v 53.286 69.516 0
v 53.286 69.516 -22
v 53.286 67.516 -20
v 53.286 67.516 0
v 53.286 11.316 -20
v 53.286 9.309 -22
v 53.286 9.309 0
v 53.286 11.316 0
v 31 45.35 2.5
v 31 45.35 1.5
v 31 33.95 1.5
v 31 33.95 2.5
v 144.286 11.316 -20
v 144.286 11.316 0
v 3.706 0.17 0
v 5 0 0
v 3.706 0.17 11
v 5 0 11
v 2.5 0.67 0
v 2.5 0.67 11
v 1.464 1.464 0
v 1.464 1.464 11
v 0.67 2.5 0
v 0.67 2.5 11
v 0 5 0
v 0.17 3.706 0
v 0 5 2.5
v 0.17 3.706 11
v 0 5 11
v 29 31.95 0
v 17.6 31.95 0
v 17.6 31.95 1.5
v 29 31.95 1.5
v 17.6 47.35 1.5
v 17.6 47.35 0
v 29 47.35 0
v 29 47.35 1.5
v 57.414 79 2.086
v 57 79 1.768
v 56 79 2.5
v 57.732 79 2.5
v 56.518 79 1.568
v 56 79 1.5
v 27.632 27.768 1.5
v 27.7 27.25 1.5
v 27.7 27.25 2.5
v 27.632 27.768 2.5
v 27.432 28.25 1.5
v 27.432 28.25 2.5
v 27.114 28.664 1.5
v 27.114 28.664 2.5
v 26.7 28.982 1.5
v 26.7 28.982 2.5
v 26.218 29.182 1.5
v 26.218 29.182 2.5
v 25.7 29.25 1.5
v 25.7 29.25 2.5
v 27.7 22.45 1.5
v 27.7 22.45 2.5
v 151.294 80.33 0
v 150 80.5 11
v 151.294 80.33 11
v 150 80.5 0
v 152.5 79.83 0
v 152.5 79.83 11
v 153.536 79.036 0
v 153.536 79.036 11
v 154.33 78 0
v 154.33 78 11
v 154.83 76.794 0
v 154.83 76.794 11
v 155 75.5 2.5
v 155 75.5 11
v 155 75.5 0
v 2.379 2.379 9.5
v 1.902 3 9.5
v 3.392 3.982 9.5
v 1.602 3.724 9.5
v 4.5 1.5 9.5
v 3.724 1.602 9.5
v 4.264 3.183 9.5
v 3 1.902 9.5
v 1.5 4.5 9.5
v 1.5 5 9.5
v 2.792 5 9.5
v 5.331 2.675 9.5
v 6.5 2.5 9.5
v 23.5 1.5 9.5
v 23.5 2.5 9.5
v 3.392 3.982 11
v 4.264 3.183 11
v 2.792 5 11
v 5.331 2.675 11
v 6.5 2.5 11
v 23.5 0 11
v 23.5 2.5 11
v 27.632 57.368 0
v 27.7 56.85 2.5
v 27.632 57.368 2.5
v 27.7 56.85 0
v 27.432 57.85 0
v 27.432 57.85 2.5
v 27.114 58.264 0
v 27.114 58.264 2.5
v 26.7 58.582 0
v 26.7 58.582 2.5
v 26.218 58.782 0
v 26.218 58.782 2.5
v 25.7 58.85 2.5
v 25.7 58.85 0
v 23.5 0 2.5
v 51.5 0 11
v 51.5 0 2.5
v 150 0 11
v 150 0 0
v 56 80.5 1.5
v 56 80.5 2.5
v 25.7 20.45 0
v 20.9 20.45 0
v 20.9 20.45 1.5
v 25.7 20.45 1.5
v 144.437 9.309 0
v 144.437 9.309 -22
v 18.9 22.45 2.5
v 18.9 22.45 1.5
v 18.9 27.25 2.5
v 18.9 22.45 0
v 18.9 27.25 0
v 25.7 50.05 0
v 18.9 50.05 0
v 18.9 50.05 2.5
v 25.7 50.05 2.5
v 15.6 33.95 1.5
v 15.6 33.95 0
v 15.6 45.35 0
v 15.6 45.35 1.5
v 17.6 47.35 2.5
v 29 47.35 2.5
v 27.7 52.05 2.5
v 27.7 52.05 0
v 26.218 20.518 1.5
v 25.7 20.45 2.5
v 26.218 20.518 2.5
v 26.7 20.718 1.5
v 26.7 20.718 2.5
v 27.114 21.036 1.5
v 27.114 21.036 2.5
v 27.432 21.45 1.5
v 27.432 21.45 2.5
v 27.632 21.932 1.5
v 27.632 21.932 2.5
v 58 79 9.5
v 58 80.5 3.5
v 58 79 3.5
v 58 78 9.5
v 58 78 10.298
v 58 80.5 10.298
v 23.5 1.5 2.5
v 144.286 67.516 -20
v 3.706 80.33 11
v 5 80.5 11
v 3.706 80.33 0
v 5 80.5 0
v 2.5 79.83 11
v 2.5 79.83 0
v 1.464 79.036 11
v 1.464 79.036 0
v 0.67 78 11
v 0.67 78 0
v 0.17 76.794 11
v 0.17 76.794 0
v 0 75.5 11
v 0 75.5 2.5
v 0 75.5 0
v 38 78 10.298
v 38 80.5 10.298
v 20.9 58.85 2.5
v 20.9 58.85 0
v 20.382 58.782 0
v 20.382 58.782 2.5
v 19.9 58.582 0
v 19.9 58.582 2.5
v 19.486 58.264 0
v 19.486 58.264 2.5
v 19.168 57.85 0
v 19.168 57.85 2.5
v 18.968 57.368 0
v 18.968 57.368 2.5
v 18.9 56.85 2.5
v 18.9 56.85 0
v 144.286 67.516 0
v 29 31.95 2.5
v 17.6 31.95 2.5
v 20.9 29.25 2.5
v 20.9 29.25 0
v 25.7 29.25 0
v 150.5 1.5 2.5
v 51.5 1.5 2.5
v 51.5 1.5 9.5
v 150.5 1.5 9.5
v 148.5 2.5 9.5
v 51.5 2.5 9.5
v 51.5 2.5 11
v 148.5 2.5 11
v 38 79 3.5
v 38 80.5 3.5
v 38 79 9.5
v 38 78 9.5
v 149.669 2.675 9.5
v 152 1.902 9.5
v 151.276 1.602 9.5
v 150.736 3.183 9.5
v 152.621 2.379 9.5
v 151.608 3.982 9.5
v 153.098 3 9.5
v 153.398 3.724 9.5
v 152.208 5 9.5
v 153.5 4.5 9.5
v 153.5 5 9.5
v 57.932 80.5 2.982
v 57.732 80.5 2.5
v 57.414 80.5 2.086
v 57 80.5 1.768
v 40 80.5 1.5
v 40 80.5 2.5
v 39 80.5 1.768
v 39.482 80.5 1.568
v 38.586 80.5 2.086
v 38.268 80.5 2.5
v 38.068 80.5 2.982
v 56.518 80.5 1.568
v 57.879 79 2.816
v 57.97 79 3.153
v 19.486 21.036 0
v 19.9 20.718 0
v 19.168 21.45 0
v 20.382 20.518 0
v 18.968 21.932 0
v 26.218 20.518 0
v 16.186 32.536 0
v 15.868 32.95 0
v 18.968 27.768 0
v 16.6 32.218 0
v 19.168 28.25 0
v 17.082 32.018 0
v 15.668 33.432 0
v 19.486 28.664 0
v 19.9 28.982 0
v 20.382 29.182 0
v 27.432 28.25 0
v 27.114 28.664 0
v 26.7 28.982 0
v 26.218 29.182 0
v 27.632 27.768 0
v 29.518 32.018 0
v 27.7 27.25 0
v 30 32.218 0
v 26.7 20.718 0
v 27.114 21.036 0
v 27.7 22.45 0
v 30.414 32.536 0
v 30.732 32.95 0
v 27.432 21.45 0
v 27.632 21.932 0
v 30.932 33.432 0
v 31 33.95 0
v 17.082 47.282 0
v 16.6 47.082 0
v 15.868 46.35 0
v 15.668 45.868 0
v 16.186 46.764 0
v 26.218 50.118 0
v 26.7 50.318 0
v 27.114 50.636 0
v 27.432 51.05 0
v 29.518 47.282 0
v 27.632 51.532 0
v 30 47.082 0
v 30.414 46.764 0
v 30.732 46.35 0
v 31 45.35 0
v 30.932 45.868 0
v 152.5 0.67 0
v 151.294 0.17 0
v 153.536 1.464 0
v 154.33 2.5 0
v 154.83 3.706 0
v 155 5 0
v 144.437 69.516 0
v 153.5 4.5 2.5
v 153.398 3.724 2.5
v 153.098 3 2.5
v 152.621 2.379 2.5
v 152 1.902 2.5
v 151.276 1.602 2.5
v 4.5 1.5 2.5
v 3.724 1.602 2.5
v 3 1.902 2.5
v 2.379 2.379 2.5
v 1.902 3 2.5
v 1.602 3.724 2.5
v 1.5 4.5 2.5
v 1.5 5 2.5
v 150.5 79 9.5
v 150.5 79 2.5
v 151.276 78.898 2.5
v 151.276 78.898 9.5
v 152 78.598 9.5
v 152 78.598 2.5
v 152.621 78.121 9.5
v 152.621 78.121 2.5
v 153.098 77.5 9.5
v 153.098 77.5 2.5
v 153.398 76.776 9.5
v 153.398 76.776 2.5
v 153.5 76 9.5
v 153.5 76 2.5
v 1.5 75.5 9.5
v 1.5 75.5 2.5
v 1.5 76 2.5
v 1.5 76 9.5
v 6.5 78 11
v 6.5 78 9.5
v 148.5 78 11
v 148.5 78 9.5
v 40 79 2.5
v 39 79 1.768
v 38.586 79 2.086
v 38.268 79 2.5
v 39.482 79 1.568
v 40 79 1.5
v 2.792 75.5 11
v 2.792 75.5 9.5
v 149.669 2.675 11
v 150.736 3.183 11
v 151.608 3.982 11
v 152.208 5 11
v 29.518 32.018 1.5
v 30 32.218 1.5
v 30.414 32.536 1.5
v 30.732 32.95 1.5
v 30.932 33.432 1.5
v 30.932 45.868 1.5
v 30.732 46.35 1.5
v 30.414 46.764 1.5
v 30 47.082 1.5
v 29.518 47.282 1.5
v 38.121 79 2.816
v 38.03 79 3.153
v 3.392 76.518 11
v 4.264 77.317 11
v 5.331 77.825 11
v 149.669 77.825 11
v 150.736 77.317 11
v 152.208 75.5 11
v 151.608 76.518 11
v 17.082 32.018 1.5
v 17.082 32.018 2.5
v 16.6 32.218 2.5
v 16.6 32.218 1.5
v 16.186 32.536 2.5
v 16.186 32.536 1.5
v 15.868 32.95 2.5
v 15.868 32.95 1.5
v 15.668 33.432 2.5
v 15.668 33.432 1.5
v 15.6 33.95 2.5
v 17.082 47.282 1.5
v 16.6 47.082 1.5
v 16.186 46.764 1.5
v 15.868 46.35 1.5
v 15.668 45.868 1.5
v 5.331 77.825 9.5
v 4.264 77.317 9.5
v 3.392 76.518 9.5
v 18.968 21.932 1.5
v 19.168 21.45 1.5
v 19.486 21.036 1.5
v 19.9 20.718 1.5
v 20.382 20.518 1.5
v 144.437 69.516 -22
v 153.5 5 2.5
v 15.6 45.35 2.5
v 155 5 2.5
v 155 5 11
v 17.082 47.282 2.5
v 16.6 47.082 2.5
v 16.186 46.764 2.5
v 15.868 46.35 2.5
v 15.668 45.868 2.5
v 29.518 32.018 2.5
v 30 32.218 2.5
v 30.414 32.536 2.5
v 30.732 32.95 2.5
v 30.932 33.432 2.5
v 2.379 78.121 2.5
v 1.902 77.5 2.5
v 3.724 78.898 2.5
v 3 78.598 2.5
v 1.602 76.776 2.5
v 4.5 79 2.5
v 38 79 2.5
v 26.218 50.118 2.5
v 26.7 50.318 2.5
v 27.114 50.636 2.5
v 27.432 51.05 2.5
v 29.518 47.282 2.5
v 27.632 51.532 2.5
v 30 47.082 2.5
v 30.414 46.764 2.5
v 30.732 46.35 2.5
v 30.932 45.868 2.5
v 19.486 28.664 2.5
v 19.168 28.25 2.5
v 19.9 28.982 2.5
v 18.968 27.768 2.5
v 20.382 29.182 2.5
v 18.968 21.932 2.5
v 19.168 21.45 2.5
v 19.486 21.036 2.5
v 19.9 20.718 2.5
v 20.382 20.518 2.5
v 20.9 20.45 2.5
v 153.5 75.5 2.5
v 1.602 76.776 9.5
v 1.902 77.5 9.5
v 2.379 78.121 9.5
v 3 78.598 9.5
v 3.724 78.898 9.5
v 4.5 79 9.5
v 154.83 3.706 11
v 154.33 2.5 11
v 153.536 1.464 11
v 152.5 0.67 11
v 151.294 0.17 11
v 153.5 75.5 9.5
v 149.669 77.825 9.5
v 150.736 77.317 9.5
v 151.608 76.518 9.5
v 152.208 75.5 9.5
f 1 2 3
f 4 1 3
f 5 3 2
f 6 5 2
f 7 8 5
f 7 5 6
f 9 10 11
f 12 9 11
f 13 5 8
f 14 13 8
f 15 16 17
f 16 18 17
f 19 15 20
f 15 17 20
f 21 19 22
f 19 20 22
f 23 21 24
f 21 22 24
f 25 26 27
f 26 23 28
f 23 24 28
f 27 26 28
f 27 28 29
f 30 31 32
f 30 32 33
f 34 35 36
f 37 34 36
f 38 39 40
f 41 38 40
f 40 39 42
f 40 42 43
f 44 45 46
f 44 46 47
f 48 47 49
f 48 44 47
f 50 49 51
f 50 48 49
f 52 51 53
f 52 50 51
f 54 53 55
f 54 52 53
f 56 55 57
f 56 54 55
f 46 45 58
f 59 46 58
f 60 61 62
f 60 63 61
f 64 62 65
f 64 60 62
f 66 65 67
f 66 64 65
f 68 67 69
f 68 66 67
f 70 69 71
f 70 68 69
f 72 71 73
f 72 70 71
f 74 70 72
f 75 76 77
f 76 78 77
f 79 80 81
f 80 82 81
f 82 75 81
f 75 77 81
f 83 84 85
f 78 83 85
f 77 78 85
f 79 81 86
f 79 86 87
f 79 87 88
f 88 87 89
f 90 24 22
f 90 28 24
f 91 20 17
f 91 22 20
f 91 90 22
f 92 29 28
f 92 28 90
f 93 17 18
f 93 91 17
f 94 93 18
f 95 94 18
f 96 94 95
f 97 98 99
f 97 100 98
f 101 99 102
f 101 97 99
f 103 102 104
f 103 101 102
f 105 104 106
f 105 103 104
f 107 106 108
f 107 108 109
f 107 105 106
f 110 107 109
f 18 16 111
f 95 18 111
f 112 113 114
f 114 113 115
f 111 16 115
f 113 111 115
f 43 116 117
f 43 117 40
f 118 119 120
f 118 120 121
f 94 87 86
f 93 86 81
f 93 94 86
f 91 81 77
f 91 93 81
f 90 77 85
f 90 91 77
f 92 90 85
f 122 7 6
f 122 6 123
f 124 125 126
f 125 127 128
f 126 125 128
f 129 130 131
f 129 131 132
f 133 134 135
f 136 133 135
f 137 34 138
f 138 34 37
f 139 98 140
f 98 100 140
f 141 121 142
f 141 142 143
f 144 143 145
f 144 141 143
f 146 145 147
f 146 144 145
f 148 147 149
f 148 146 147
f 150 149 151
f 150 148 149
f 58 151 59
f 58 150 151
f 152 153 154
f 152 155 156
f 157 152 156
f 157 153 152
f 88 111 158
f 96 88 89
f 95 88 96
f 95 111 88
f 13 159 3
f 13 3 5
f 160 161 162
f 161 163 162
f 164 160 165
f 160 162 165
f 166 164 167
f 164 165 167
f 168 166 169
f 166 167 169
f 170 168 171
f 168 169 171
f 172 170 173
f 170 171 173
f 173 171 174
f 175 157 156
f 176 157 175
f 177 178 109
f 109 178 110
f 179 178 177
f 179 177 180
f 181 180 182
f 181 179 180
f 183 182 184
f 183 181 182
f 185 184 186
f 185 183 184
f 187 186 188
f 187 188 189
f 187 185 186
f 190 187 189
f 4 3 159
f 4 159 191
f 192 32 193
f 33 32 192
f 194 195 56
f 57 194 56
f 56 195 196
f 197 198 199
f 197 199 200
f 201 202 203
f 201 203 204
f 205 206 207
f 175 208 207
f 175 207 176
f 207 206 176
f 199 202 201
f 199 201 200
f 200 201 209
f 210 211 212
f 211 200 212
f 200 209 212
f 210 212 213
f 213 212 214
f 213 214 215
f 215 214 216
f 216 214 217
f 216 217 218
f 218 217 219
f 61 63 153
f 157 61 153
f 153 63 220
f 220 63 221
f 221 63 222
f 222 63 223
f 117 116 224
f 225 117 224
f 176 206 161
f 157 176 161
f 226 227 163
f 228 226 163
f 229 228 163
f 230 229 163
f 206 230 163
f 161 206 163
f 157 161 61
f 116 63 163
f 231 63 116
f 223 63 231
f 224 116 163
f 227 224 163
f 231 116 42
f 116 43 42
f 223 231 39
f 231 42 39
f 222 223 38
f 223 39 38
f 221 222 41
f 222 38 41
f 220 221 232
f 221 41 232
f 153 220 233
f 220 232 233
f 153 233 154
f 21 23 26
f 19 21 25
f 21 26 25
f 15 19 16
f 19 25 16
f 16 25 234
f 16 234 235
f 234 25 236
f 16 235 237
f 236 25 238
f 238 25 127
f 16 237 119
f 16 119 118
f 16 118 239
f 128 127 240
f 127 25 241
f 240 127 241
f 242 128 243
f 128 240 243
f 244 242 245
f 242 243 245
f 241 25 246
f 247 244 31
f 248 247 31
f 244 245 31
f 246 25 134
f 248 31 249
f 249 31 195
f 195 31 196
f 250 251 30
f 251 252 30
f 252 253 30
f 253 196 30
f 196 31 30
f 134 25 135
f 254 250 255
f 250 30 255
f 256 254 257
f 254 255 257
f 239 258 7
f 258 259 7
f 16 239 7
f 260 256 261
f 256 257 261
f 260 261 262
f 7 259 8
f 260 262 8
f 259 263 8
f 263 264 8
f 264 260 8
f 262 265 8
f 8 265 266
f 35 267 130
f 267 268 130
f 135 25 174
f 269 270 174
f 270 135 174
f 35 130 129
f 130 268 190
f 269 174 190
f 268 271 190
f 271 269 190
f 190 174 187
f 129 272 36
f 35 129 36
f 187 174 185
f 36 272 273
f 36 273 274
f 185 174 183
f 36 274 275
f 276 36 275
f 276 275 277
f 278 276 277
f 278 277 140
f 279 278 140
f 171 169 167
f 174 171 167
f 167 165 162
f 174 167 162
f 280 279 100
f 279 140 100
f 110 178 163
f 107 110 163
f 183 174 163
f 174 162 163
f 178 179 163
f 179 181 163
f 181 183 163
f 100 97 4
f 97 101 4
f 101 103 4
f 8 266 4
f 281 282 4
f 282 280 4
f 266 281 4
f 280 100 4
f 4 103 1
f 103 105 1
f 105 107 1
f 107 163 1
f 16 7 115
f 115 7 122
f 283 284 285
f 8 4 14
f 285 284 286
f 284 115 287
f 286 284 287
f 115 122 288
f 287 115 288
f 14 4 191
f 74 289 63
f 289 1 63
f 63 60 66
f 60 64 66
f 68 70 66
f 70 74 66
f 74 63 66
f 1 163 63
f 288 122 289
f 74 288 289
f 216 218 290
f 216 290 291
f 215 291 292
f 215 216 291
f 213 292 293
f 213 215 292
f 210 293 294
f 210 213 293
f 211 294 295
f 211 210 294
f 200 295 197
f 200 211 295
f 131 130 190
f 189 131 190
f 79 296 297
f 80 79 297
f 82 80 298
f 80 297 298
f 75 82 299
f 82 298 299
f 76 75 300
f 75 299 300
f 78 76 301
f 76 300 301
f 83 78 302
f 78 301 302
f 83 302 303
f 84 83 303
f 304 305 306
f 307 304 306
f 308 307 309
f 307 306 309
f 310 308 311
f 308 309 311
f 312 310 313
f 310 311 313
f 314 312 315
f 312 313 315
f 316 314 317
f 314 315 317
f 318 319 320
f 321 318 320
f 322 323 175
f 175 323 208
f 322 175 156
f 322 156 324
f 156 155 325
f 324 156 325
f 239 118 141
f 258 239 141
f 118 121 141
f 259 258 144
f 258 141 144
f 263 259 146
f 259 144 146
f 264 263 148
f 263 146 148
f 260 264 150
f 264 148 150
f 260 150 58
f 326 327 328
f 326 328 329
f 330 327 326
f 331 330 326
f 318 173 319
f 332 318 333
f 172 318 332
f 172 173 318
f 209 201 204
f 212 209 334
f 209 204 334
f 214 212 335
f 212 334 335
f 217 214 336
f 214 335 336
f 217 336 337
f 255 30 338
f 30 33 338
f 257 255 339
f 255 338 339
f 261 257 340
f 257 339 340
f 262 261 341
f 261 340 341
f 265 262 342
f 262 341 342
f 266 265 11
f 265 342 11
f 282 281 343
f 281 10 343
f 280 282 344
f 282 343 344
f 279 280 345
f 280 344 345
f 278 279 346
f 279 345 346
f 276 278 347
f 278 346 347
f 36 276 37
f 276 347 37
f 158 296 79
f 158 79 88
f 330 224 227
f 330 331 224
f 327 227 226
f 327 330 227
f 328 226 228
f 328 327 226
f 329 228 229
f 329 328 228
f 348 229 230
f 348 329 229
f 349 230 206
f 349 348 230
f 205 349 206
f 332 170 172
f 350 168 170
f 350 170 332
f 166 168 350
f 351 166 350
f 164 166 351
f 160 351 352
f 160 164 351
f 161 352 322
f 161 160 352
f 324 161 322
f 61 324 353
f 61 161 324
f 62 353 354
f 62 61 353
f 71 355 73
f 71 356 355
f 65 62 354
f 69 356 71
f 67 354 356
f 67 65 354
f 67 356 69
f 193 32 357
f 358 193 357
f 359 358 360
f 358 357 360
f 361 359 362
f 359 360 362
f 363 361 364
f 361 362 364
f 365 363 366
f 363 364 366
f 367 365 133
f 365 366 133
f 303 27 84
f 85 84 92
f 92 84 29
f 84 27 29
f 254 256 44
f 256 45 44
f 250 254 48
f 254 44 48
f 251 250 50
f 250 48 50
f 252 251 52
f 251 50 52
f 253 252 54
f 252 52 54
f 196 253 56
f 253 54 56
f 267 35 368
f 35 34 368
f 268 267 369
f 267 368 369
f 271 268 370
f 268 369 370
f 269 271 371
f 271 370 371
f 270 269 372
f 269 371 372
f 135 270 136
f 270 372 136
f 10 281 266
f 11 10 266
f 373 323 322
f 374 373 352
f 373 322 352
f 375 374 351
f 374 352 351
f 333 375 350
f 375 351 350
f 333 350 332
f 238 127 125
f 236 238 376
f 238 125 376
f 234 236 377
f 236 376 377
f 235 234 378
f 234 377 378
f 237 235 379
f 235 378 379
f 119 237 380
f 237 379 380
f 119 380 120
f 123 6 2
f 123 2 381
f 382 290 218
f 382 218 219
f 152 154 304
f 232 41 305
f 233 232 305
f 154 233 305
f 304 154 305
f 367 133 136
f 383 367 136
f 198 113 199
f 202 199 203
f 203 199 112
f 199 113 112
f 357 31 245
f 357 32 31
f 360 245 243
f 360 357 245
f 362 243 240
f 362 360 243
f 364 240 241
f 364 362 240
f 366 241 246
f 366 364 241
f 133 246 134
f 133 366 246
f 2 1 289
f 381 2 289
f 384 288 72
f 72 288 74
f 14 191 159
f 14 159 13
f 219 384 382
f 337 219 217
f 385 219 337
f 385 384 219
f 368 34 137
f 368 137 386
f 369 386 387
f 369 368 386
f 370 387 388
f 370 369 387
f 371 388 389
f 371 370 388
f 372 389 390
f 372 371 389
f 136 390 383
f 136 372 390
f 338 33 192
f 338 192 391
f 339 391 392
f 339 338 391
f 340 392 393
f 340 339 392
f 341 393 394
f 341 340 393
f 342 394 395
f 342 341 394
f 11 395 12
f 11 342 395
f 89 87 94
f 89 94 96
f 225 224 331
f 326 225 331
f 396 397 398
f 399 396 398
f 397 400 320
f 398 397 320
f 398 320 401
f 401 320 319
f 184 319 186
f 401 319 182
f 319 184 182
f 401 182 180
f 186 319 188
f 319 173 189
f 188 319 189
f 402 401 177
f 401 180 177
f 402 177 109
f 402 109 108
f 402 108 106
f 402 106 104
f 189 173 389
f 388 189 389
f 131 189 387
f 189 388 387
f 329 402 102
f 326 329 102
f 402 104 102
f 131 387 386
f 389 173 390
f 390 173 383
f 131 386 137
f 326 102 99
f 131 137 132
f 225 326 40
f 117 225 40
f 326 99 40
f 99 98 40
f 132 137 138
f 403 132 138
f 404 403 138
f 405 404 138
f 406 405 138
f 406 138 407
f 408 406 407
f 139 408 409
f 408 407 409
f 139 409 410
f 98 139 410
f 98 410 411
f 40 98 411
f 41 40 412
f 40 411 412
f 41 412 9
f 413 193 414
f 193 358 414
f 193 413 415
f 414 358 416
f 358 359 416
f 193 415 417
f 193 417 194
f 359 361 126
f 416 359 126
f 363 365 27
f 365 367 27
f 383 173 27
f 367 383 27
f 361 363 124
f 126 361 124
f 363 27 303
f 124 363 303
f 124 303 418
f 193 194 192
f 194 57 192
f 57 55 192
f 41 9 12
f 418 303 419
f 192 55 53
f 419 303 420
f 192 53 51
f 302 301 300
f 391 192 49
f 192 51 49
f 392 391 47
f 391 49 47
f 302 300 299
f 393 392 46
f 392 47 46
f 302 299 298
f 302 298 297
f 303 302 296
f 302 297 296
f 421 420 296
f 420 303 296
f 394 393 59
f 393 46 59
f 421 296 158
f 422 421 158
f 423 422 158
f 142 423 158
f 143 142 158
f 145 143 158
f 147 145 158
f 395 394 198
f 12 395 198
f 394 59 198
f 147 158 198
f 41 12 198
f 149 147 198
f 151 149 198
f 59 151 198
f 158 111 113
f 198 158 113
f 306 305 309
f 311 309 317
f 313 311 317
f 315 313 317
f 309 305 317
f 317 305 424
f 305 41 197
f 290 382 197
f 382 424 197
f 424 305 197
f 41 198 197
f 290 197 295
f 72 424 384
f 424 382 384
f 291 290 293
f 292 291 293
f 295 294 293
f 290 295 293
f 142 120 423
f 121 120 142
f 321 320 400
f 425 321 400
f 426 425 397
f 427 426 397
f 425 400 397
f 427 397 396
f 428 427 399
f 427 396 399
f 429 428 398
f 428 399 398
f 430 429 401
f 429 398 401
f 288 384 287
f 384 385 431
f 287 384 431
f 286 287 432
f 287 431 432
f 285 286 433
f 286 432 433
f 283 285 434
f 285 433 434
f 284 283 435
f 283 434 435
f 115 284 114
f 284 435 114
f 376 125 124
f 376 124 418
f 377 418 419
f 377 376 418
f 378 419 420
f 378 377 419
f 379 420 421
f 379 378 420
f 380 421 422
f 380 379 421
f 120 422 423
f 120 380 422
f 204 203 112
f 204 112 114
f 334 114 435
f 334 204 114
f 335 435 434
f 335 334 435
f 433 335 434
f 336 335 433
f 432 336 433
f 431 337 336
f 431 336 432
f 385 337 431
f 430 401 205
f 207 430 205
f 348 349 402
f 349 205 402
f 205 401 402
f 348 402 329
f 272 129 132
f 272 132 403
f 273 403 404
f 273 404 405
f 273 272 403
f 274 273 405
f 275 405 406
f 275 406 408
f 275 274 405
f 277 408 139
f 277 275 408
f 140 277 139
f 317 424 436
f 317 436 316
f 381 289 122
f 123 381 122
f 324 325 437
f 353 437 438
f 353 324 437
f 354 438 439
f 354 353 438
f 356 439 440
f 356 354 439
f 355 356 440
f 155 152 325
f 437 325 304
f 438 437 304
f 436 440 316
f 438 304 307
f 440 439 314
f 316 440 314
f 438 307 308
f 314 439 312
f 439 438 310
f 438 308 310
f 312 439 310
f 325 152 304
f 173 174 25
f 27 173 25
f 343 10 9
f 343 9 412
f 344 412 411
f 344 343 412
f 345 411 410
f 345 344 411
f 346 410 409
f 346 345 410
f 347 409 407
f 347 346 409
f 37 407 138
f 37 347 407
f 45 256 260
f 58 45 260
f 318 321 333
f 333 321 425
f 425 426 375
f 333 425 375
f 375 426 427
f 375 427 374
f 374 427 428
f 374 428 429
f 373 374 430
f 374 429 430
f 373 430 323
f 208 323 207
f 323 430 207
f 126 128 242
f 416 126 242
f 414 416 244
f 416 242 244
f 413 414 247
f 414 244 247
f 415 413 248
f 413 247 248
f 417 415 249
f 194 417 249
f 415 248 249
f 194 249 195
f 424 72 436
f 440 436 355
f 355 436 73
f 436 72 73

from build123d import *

# Parameters (mm, degrees)
F0_W      = 155
F0_H      = 80.5
F1_DEPTH  = 9.5
F2_T      = -1.5
F3_W      = 155
F3_H      = 80.5
F3_W_2    = 152
F3_H_2    = 77.5
F3_W_3    = 150
F3_H_3    = 75.5
F4_DEPTH  = 1.5
F5_W      = 20
F5_H      = 8.7980394721
F6_DEPTH  = 2.501
F7_W      = 8.8
F7_H      = 4.4
F7_W_2    = 15.4
F7_H_2    = 7.7
F8_DEPTH  = 1.5
F9_R      = 2
F10_R     = 5
F11_R     = 3
F12_F1_R  = 4
F12_F2_R  = 4
F12_F3_R  = 4
F12_F4_R  = 4
F13_W     = 70.5
F13_H     = 9.5
F14_DEPTH = 2.7929007565
F15_W     = 70.5
F15_H     = 9.5
F16_DEPTH = 2.7929007565
F17_W     = 28
F17_H     = 9.5
F18_DEPTH = 2.501
F19_DEPTH = 1
F20_W     = 91.1511071026
F20_H     = 60.2068249136
F21_DEPTH = 22
F22_W     = 56.2
F22_H     = 20
F23_DEPTH = 91


with BuildPart() as f1:
    # F0 (on Top) → F1 (new body)
    with BuildSketch(Plane.XY):
        with Locations((77.5, 40.25)):
            Rectangle(F0_W, F0_H)
    extrude(amount=F1_DEPTH)

    # F2
    f2_openings = [f1.faces().sort_by_distance(p)[0] for p in [
        (77.5, 40.25, 9.5),
    ]]
    offset(amount=F2_T, openings=f2_openings)

    # F3 (on face) → F4 (join)
    with BuildSketch(Plane.XY.offset(9.5)):
        with Locations((77.5, 40.25)):
            Rectangle(F3_W, F3_H)
        with Locations((77.5, 40.25)):
            Rectangle(F3_W_2, F3_H_2, mode=Mode.SUBTRACT)
        with Locations((77.5, 40.25)):
            Rectangle(F3_W_2, F3_H_2)
        with Locations((77.5, 40.25)):
            Rectangle(F3_W_3, F3_H_3, mode=Mode.SUBTRACT)
    extrude(amount=F4_DEPTH)

    # F5 (on face) → F6 (cut, through all)
    with BuildSketch(Plane(origin=(0, 80.5, 0), x_dir=(-1, 0, 0), z_dir=(0, 1, 0))):
        with Locations((-48, 5.8990197361)):
            Rectangle(F5_W, F5_H)
    extrude(amount=-F6_DEPTH, mode=Mode.SUBTRACT)

    # F7 (on face) → F8 (cut, through all)
    with BuildSketch(Plane(origin=(0, 0, 0), x_dir=(1, 0, 0), z_dir=(0, 0, -1))):
        with Locations((23.3, -27.05)):
            Rectangle(F7_W, F7_H)
        with Locations((23.3, -22.65)):
            Rectangle(F7_W, F7_H)
        with Locations((23.3, -35.8)):
            Rectangle(F7_W_2, F7_H_2)
        with Locations((23.3, -43.5)):
            Rectangle(F7_W_2, F7_H_2)
        with Locations((23.3, -52.25)):
            Rectangle(F7_W, F7_H)
        with Locations((23.3, -56.65)):
            Rectangle(F7_W, F7_H)
    extrude(amount=-F8_DEPTH, mode=Mode.SUBTRACT)

    # F9
    f9_edges = [f1.edges().sort_by_distance(p)[0] for p in [
        (18.9, 29.25, 0.75),
        (15.6, 47.35, 0.75),
        (18.9, 58.85, 0.75),
        (18.9, 20.45, 0.75),
        (15.6, 31.95, 0.75),
        (27.7, 50.05, 0.75),
        (31, 31.95, 0.75),
        (27.7, 20.45, 0.75),
        (27.7, 29.25, 0.75),
        (31, 47.35, 0.75),
        (27.7, 58.85, 0.75),
        (58, 79.75, 1.5),
        (38, 79.75, 1.5),
    ]]
    fillet(f9_edges, radius=F9_R)

    # F10
    f10_edges = [f1.edges().sort_by_distance(p)[0] for p in [
        (0, 0, 5.5),
        (0, 80.5, 5.5),
        (155, 0, 5.5),
        (155, 80.5, 5.5),
    ]]
    fillet(f10_edges, radius=F10_R)

    # F11
    f11_edges = [f1.edges().sort_by_distance(p)[0] for p in [
        (1.5, 79, 5.5),
        (1.5, 1.5, 5.5),
        (153.5, 79, 5.5),
        (153.5, 1.5, 5.5),
    ]]
    fillet(f11_edges, radius=F11_R)

    # F12: fillet of radius 4 on 4 edges, made by hand

    # F12_f1
    f12_f1_edges = [f1.edges().sort_by_distance(p)[0] for p in [
        (152.5, 78, 10.25),
    ]]
    fillet(f12_f1_edges, radius=F12_F1_R)

    # F12_f2
    f12_f2_edges = [f1.edges().sort_by_distance(p)[0] for p in [
        (2.5, 78, 10.25),
    ]]
    fillet(f12_f2_edges, radius=F12_F2_R)

    # F12_f3
    f12_f3_edges = [f1.edges().sort_by_distance(p)[0] for p in [
        (152.5, 2.5, 10.25),
    ]]
    fillet(f12_f3_edges, radius=F12_F3_R)

    # F12_f4
    f12_f4_edges = [f1.edges().sort_by_distance(p)[0] for p in [
        (2.5, 2.5, 10.25),
    ]]
    fillet(f12_f4_edges, radius=F12_F4_R)

    # F13 (on face) → F14 (cut, through all)
    with BuildSketch(Plane(origin=(0, 0, 0), x_dir=(0, -1, 0), z_dir=(-1, 0, 0))):
        with Locations((-40.25, 6.25)):
            Rectangle(F13_W, F13_H)
    extrude(amount=-F14_DEPTH, mode=Mode.SUBTRACT)

    # F15 (on face) → F16 (cut, through all)
    with BuildSketch(Plane.YZ.offset(155)):
        with Locations((40.25, 6.25)):
            Rectangle(F15_W, F15_H)
    extrude(amount=-F16_DEPTH, mode=Mode.SUBTRACT)

    # F17 (on face) → F18 (cut, through all)
    with BuildSketch(Plane.XZ):
        with Locations((37.5, 6.25)):
            Rectangle(F17_W, F17_H)
    extrude(amount=-F18_DEPTH, mode=Mode.SUBTRACT)

    # F19 (add): a face of the model
    f19_faces = [f1.faces().sort_by_distance(p)[0] for p in [
        (79.0729751372, 40.2079373473, 1.5),
    ]]
    extrude(f19_faces, amount=F19_DEPTH)

    # F20 (on face) → F21 (join)
    with BuildSketch(Plane(origin=(0, 0, 0), x_dir=(1, 0, 0), z_dir=(0, 0, -1))):
        with Locations((98.8614168018, -39.4122553989)):
            Rectangle(F20_W, F20_H)
    extrude(amount=F21_DEPTH)

    # F22 (on face) → F23 (cut)
    with BuildSketch(Plane(origin=(53.2858632505, 0, 0), x_dir=(0, -1, 0), z_dir=(-1, 0, 0))):
        with Locations((-39.4156678557, -10)):
            Rectangle(F22_W, F22_H)
    extrude(amount=-F23_DEPTH, mode=Mode.SUBTRACT)


solid = f1.part
